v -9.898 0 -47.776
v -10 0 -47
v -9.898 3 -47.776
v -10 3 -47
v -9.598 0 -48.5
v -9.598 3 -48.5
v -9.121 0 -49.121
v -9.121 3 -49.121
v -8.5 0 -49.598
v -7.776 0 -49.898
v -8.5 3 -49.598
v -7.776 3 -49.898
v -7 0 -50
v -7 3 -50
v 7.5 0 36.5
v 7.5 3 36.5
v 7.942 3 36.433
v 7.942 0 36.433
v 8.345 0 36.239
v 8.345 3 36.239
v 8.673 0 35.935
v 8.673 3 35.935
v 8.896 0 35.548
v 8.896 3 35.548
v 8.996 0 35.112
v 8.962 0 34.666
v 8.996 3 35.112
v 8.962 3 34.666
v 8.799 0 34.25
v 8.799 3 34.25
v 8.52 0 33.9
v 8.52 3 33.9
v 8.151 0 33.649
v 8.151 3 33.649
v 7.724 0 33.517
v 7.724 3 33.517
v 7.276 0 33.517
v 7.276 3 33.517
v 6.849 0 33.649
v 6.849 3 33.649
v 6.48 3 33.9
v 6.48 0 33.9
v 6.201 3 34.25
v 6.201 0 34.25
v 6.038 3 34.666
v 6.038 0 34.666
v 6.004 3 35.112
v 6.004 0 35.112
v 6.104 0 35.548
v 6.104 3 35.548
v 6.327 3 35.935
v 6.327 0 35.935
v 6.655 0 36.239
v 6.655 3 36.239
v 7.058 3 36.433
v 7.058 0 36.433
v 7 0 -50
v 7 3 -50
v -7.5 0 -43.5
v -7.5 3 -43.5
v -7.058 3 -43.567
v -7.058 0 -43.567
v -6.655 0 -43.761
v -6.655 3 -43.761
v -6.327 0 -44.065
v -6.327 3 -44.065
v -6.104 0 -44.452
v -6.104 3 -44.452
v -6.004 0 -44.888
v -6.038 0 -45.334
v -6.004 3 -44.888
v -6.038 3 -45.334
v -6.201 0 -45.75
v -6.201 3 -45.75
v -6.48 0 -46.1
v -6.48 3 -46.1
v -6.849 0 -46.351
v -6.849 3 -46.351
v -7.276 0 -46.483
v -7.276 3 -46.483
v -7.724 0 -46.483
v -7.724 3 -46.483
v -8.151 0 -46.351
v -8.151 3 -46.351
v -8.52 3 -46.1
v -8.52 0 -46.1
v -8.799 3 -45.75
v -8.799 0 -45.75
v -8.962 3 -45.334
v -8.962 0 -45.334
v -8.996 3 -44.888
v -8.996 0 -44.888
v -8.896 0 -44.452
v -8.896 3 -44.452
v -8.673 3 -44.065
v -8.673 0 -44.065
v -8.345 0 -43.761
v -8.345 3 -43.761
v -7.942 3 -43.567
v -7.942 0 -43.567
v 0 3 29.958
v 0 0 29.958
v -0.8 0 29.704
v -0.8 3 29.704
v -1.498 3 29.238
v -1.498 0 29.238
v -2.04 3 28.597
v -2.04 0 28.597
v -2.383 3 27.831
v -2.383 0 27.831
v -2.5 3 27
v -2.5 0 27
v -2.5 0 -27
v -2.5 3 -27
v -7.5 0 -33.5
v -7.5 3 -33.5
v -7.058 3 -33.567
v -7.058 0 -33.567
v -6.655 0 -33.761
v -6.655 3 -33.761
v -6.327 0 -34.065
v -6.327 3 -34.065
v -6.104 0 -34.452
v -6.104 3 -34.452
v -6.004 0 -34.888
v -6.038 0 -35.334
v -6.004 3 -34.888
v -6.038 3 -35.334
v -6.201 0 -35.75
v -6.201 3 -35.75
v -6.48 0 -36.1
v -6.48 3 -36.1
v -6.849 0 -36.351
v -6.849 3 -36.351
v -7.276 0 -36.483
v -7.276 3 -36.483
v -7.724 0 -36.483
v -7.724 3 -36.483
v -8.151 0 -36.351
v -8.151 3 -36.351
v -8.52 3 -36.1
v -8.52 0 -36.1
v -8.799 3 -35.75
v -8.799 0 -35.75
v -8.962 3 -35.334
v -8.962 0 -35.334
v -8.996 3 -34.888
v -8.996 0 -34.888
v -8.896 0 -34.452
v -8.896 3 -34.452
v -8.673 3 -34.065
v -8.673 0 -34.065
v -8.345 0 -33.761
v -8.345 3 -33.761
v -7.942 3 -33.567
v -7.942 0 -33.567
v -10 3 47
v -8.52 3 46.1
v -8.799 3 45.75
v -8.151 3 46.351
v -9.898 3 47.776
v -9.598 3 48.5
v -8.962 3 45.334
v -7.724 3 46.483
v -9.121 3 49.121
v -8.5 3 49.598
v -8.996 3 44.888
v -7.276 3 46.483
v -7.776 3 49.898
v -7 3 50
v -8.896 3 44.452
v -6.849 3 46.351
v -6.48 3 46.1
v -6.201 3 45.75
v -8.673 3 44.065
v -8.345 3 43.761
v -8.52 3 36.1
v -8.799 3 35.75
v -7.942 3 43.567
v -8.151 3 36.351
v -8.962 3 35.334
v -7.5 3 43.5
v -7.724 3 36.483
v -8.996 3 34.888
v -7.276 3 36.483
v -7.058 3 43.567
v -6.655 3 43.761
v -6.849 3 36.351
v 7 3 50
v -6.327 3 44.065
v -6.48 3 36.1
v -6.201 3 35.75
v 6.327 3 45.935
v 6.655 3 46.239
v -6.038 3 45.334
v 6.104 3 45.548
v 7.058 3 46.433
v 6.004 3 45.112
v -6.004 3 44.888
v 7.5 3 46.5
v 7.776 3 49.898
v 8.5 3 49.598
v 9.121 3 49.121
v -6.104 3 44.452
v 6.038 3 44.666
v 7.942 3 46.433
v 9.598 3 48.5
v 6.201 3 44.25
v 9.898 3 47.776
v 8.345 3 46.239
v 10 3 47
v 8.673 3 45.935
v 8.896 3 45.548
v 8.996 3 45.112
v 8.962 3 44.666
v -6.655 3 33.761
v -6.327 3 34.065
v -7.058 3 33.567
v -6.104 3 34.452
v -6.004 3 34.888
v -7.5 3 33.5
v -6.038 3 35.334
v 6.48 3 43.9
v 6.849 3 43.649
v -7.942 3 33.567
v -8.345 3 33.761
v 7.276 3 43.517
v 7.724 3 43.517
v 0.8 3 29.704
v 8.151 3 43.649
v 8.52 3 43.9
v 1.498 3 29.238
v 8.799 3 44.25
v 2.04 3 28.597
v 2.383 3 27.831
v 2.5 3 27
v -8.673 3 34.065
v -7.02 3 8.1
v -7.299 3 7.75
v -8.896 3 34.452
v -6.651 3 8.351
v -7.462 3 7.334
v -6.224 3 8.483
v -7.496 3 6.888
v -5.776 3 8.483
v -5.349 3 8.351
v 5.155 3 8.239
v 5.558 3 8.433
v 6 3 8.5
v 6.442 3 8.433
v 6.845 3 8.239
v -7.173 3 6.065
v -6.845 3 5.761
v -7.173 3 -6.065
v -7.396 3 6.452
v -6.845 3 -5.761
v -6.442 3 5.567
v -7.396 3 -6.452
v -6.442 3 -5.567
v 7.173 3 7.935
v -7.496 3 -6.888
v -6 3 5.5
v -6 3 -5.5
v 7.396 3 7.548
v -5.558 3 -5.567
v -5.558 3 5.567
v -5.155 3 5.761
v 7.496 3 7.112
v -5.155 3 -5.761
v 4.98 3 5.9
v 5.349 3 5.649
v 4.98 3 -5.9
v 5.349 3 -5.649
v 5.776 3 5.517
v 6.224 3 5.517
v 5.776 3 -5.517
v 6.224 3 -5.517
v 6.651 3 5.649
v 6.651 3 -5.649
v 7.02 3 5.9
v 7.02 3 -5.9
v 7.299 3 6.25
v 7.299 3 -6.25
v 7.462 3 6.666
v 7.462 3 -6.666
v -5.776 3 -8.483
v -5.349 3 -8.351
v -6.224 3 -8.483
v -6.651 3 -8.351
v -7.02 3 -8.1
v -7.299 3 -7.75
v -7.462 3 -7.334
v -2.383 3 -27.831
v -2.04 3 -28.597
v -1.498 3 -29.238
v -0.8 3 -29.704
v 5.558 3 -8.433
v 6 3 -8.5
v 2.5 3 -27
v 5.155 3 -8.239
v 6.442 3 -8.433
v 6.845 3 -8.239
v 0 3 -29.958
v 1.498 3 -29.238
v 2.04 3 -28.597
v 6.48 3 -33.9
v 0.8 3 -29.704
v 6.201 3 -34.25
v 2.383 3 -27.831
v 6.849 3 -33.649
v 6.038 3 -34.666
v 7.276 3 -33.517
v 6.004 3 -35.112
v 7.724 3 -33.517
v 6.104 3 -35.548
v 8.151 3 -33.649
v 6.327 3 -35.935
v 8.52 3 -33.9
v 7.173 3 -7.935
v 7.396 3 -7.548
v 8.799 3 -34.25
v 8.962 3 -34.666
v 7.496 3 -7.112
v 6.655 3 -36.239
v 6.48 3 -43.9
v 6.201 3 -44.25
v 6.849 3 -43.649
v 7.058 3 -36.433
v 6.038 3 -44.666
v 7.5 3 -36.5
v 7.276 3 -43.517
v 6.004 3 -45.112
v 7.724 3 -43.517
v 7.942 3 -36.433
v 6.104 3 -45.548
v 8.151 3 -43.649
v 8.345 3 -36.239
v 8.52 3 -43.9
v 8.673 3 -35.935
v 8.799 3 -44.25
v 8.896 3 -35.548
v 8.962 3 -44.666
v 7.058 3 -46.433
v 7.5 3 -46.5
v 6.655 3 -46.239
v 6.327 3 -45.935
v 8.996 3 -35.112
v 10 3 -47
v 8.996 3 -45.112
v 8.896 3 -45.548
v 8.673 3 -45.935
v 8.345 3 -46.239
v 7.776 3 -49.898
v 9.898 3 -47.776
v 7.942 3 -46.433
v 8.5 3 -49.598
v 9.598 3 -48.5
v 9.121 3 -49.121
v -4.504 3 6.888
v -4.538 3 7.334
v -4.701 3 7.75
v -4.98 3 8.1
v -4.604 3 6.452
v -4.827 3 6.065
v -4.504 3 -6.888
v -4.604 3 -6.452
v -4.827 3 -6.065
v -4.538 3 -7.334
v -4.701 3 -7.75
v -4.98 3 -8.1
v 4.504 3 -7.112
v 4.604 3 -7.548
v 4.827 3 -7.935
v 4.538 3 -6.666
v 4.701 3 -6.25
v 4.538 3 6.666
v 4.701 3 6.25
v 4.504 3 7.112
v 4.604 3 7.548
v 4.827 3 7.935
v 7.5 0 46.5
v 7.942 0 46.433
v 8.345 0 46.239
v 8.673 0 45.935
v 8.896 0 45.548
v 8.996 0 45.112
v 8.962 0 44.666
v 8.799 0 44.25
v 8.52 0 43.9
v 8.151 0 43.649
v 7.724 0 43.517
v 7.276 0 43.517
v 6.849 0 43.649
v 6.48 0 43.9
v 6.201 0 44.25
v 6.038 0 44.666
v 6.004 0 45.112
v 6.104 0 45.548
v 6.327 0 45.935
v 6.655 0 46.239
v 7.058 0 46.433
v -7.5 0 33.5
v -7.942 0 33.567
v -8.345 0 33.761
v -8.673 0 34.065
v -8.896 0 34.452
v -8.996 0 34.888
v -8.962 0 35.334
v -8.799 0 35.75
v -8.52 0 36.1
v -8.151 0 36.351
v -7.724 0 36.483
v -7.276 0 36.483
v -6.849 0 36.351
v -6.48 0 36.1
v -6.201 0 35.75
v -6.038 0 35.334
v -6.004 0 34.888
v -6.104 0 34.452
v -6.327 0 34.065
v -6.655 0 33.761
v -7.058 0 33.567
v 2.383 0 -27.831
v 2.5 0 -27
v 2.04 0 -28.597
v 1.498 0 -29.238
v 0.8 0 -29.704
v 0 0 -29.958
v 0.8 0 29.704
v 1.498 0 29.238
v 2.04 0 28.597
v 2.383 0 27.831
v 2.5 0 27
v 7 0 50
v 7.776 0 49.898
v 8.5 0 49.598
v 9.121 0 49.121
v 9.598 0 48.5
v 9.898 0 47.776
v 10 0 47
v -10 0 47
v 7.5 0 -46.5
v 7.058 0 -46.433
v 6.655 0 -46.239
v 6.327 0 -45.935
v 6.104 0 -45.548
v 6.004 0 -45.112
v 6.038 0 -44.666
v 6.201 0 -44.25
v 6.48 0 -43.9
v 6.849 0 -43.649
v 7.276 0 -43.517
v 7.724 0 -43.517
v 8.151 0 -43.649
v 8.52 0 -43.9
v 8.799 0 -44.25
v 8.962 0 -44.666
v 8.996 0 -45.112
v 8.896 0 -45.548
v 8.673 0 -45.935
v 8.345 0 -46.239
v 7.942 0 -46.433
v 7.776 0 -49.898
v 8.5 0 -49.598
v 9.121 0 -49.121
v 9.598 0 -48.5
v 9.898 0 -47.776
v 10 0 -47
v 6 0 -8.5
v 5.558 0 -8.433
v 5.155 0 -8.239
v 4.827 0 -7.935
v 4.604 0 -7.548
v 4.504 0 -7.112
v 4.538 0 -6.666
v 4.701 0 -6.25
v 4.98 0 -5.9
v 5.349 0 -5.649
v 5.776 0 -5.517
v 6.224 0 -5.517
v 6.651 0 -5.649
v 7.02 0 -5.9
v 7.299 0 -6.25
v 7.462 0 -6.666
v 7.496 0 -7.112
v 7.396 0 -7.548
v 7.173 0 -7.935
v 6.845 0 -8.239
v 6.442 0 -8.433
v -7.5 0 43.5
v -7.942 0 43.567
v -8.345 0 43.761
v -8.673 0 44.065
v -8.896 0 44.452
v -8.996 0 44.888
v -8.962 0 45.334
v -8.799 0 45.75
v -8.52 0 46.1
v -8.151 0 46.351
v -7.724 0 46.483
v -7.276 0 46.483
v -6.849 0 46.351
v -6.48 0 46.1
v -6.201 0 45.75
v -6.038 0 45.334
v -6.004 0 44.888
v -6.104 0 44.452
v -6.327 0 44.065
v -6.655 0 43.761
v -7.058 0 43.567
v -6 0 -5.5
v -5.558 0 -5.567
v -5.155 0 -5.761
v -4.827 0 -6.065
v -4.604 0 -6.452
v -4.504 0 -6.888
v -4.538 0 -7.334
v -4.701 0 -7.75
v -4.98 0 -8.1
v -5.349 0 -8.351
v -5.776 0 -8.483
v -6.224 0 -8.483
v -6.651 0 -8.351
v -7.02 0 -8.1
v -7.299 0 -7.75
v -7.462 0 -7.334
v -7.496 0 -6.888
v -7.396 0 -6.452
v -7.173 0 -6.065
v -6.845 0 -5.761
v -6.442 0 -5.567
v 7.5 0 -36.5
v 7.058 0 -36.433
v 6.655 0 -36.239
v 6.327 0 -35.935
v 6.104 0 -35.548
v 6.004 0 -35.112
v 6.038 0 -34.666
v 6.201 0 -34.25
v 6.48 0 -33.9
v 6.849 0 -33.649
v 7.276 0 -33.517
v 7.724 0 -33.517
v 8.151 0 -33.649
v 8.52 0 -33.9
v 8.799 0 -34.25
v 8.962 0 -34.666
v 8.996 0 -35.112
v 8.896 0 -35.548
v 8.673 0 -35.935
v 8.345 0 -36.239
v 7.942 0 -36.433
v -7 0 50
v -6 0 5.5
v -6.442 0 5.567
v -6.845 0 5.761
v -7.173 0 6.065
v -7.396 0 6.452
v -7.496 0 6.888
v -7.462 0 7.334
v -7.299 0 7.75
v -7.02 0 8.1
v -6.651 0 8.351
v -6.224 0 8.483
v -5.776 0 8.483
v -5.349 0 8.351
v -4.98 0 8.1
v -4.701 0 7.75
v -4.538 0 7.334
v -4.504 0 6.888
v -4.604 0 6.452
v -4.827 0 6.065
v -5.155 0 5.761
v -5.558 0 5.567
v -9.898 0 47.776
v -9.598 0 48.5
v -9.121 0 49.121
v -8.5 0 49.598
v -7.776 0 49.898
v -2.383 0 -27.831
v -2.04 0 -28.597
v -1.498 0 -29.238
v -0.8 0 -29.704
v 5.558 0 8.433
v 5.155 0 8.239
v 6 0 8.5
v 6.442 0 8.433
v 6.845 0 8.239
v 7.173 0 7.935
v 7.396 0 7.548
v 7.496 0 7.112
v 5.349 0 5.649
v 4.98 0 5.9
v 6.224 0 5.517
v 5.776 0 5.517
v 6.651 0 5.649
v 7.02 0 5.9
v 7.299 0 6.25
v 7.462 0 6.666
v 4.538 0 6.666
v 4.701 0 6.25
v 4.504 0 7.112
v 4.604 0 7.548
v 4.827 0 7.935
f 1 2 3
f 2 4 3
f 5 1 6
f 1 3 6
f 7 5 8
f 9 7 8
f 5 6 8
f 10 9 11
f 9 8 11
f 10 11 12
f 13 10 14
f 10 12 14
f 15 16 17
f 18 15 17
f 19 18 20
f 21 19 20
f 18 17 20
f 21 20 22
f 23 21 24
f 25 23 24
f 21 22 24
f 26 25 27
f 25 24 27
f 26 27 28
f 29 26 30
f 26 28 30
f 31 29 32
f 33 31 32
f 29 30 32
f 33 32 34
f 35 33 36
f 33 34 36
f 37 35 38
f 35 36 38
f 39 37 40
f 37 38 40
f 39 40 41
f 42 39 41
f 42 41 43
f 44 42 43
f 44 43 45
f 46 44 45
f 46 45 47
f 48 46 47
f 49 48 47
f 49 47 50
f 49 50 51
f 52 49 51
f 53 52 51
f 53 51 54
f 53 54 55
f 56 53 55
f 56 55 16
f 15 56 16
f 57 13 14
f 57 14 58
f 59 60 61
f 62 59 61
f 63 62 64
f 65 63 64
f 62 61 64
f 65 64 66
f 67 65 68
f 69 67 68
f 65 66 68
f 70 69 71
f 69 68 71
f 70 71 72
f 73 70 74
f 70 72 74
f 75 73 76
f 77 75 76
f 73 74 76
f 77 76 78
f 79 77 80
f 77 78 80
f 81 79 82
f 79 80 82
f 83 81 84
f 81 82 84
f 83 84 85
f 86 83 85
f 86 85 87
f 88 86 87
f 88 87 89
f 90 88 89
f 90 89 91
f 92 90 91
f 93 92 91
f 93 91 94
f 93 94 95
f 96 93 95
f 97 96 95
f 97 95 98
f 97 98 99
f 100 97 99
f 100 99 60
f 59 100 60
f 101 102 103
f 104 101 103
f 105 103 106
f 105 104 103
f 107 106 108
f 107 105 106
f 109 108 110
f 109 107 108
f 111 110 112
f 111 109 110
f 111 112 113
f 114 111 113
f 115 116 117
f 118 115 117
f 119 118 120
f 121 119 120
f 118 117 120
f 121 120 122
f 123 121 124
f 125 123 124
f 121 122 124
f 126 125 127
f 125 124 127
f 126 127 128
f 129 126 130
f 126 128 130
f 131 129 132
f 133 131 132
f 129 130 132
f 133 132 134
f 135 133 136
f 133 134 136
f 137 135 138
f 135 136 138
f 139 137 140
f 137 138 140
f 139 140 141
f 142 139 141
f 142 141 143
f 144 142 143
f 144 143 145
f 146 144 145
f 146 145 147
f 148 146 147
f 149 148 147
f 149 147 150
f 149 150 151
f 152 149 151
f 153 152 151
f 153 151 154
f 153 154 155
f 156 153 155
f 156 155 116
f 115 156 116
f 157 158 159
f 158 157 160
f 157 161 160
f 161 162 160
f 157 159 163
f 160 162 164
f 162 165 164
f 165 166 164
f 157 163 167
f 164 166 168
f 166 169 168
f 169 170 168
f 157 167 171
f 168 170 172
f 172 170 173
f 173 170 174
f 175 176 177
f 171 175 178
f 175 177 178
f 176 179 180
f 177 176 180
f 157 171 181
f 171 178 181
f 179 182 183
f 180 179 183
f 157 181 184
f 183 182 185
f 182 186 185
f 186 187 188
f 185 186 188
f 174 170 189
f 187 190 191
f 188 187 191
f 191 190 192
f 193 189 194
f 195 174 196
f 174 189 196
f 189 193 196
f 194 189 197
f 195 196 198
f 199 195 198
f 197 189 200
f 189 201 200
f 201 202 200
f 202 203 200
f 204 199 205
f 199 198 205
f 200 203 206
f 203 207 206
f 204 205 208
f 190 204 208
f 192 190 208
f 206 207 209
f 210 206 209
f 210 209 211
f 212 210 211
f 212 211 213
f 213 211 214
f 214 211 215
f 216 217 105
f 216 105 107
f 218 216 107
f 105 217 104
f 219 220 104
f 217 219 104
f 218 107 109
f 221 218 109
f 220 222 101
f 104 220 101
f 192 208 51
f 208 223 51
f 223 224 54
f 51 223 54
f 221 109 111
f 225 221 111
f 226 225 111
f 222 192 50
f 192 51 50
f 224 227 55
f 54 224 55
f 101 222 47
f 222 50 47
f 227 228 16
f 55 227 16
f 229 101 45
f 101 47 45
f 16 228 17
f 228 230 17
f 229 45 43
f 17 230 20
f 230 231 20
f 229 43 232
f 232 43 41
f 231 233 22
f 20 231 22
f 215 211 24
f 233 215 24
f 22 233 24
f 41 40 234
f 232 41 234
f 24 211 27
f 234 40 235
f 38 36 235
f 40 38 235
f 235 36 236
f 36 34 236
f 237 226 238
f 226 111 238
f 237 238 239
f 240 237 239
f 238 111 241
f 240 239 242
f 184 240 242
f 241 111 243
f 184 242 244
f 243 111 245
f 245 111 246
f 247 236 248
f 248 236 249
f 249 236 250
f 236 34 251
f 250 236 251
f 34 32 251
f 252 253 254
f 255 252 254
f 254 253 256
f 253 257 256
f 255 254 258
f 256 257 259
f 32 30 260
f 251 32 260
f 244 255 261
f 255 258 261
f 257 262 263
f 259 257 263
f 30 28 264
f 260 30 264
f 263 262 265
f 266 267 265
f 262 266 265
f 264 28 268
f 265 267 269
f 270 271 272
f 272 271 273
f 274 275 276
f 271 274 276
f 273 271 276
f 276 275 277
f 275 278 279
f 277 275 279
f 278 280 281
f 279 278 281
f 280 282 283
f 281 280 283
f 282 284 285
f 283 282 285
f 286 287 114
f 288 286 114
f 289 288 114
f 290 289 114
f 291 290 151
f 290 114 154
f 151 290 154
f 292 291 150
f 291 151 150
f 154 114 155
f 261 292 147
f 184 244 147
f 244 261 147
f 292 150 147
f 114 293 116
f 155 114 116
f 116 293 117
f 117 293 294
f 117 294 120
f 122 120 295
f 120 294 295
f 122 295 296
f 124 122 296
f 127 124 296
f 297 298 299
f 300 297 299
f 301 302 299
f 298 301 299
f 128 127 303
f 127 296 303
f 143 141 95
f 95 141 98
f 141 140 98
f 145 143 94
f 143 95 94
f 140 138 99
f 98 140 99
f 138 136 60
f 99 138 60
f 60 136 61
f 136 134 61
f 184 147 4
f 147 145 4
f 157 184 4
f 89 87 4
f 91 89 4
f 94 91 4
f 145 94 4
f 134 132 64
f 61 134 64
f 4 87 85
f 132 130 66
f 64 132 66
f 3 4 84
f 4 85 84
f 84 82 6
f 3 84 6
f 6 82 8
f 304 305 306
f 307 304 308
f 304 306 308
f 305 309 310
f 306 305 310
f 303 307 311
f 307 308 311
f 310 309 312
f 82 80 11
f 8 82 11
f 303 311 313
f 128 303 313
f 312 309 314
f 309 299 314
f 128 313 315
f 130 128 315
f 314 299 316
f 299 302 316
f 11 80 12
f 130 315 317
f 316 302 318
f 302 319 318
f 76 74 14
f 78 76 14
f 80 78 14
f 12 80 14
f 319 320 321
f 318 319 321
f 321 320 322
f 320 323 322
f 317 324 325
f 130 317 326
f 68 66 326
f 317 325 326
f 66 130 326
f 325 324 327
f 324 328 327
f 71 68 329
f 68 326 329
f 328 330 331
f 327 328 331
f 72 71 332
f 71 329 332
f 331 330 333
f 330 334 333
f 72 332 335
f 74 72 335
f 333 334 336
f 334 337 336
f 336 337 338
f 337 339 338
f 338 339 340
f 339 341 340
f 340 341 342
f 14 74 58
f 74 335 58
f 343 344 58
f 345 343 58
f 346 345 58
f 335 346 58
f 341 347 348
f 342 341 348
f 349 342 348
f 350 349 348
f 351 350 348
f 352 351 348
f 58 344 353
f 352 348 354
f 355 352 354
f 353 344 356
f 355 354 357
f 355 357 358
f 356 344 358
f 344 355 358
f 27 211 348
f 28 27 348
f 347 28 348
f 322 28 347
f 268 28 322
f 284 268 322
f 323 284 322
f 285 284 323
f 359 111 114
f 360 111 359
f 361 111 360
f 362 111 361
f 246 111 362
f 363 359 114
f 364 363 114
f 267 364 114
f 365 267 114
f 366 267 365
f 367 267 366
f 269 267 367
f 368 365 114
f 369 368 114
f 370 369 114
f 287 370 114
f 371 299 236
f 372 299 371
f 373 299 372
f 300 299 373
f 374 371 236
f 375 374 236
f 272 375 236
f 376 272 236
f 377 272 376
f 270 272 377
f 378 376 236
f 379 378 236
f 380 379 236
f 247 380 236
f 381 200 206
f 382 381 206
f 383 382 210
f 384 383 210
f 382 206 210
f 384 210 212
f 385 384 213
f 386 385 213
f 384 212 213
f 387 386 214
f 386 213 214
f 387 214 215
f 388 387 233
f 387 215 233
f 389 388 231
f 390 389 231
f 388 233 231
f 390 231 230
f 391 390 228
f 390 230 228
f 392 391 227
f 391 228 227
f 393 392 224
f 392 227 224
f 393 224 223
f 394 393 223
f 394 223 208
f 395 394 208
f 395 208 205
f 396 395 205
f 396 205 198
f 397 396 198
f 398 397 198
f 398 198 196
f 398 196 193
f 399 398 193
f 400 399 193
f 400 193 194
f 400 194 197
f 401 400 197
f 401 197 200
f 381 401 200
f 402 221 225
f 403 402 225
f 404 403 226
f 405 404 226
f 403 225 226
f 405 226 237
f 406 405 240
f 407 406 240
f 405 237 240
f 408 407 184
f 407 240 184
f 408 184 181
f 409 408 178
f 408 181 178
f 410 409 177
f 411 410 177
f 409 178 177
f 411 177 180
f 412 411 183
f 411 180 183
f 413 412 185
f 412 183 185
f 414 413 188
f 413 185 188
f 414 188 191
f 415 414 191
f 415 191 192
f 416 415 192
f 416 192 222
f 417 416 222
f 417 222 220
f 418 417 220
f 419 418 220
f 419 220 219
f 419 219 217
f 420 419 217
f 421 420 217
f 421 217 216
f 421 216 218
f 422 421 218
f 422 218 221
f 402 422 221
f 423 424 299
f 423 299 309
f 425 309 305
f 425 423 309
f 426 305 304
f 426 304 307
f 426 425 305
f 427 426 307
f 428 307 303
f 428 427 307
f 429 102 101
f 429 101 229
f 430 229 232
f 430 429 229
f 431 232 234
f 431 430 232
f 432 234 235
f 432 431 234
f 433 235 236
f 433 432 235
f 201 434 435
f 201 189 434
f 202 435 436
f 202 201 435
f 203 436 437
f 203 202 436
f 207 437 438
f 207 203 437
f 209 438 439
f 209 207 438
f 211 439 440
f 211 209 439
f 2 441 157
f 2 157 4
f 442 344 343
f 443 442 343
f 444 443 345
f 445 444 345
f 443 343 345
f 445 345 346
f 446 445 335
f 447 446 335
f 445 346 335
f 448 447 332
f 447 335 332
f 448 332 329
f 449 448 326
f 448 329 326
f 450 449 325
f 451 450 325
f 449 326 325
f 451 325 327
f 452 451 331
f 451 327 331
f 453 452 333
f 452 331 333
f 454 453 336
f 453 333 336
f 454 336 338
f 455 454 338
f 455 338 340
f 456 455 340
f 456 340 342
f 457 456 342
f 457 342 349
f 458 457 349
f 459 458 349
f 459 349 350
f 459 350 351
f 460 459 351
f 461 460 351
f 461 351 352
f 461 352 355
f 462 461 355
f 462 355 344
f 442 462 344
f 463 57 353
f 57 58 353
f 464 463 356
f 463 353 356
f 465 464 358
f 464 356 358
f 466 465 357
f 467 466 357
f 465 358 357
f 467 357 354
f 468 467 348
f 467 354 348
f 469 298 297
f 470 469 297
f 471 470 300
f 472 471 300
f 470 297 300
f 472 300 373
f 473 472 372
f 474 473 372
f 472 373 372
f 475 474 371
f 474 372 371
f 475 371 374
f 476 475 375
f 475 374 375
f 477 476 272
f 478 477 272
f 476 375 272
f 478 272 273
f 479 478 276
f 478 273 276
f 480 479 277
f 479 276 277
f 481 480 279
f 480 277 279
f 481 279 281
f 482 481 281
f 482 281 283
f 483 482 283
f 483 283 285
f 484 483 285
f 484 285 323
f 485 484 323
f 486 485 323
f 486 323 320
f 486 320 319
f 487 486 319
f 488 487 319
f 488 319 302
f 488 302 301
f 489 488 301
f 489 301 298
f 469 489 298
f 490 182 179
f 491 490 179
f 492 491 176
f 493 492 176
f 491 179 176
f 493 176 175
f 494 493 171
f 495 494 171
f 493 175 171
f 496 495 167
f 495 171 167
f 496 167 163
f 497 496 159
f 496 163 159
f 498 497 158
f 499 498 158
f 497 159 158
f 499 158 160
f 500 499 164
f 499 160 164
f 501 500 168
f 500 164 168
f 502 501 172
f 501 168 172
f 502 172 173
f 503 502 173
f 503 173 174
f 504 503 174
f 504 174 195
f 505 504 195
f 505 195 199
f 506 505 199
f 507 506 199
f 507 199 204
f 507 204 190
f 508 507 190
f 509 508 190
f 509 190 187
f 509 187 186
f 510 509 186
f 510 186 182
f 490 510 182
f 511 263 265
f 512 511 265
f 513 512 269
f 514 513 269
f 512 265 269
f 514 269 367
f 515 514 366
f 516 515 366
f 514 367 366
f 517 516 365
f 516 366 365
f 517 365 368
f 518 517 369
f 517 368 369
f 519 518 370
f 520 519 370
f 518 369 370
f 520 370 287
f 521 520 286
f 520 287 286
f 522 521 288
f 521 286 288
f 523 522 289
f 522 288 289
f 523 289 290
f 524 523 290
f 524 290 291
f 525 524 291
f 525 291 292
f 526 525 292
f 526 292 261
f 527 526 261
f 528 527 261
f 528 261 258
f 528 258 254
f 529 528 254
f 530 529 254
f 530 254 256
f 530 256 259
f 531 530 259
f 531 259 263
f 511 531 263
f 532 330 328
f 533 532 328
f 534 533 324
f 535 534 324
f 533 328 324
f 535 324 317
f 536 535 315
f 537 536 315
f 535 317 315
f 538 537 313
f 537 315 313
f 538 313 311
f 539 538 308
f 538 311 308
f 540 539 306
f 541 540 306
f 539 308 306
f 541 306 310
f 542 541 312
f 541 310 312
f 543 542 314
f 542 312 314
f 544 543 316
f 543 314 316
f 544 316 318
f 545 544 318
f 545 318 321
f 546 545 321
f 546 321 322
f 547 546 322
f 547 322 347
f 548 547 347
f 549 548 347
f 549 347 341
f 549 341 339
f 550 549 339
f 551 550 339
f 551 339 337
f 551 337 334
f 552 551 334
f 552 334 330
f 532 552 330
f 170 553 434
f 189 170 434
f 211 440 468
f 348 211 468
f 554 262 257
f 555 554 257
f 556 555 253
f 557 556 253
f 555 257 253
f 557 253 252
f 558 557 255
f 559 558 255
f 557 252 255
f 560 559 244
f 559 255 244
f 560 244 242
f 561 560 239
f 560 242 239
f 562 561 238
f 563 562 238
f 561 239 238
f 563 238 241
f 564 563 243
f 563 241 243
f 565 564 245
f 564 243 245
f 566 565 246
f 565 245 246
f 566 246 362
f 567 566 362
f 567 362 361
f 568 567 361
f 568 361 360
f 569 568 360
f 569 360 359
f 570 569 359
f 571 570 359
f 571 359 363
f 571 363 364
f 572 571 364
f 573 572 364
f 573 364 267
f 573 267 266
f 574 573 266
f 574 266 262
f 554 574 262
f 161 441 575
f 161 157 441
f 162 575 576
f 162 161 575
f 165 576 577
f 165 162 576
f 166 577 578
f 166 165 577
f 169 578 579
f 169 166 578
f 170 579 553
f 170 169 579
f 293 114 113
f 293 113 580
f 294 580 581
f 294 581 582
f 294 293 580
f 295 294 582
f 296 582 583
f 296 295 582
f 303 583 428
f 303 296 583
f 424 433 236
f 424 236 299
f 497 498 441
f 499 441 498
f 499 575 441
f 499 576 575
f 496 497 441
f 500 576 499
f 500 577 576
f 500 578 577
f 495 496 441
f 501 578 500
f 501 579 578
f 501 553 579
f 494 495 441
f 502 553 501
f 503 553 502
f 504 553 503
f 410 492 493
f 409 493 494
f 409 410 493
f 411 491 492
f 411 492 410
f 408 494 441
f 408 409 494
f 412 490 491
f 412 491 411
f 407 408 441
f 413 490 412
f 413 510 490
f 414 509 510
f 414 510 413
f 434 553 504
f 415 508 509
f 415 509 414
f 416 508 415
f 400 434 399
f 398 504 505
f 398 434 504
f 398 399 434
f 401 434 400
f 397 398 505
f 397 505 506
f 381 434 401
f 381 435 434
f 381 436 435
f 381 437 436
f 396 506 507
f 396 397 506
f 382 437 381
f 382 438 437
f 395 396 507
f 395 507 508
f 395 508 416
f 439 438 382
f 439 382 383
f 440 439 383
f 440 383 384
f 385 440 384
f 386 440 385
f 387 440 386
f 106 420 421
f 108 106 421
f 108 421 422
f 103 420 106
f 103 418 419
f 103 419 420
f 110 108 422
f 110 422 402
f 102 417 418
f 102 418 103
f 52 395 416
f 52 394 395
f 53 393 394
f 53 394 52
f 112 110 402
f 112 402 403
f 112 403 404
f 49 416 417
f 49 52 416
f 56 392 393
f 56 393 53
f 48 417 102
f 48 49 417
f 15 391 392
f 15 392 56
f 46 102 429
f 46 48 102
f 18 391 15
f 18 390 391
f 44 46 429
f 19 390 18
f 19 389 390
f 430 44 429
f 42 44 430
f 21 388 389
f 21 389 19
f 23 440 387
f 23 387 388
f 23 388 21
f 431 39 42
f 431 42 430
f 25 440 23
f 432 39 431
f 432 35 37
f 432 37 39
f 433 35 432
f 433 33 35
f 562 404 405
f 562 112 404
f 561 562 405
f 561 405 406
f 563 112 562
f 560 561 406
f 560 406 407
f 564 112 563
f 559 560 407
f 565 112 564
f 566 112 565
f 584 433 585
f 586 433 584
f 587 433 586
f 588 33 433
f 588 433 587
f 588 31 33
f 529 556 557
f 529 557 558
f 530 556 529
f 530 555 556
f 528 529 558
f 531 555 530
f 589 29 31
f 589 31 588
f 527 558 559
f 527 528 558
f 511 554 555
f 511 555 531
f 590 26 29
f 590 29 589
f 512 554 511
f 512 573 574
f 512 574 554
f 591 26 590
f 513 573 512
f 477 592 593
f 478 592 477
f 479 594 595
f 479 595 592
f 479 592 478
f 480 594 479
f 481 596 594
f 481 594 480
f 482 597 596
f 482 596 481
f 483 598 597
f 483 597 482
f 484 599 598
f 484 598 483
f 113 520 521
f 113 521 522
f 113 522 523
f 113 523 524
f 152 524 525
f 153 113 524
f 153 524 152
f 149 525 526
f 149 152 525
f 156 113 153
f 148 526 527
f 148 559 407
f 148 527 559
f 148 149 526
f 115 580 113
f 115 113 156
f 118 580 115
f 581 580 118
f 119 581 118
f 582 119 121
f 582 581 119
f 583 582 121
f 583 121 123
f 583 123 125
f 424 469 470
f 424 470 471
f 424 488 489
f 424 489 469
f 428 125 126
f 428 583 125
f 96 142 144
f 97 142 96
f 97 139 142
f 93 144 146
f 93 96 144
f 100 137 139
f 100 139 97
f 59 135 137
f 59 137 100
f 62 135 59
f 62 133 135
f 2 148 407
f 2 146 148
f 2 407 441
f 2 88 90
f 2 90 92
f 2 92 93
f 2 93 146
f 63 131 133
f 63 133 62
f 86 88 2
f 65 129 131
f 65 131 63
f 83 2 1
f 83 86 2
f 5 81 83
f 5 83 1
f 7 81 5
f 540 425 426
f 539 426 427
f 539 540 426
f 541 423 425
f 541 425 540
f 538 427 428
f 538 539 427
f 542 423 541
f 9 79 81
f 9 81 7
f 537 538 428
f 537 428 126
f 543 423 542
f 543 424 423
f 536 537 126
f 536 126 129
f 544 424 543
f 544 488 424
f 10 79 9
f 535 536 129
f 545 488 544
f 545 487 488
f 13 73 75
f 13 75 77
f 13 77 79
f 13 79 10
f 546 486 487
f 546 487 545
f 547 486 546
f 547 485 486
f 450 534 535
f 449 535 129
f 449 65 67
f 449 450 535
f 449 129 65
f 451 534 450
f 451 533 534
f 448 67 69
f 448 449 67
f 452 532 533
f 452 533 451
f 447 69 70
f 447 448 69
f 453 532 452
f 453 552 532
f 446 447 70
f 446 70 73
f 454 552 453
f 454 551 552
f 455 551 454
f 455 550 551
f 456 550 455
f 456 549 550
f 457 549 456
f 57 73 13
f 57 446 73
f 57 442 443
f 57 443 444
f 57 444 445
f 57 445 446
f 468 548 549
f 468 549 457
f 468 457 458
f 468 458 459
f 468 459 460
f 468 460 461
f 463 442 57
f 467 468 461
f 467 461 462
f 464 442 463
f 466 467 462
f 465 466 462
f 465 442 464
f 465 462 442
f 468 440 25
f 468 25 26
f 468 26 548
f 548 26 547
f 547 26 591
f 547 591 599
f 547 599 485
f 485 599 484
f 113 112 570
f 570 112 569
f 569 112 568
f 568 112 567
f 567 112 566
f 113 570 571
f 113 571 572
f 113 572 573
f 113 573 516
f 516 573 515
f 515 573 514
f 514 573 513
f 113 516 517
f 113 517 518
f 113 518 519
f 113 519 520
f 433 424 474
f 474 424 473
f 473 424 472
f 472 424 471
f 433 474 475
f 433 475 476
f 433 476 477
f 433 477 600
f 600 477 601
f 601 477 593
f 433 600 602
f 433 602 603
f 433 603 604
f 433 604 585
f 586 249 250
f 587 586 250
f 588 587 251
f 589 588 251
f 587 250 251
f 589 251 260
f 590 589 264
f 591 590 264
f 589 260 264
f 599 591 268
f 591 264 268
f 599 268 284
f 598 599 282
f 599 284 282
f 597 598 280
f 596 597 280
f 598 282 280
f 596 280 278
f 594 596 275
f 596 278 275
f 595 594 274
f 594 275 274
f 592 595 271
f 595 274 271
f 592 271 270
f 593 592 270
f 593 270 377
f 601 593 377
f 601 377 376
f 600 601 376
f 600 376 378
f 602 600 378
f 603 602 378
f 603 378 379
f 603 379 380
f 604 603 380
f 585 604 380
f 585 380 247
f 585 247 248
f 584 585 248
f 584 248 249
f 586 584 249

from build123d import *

# Parameters (mm, degrees)
SKETCH_1_W               = 20
SKETCH_1_H               = 100
EXTRUDE_1_DEPTH          = 3
SKETCH_2_R               = 1.5
CUT_EXTRUDE_1_DEPTH      = 52.078371156
CUT_EXTRUDE_2_DEPTH      = 52.078371156
CUT_EXTRUDE_2_DEPTH_BACK = 52.078371156
SKETCH_3_W               = 5
SKETCH_3_H               = 60
FILLET_1_R               = 3
FILLET_2_R               = 3
SKETCH_4_R               = 1.5
CUT_EXTRUDE_3_DEPTH      = 52.078371156


with BuildPart() as part:
    # 草图1 → 凸台-拉伸1 (new body)
    with BuildSketch(Plane(origin=(0, 0, 0), x_dir=(1, 0, 0), z_dir=(0, 1, 0))):
        Rectangle(SKETCH_1_W, SKETCH_1_H)
    extrude(amount=EXTRUDE_1_DEPTH)

    # 草图2 → 切除-拉伸1 (cut, through all)
    with BuildSketch(Plane(origin=(0, 3, 0), x_dir=(1, 0, 0), z_dir=(0, 1, 0))):
        with Locations(Location((-7.5, 45, 0), (0, 0, 270))):
            Circle(SKETCH_2_R)
        with Locations(Location((-7.5, 35, 0), (0, 0, 270))):
            Circle(SKETCH_2_R)
        with Locations(Location((7.5, 45, 0), (0, 0, 90))):
            Circle(SKETCH_2_R)
        with Locations(Location((7.5, 35, 0), (0, 0, 90))):
            Circle(SKETCH_2_R)
        with Locations(Location((7.5, -35, 0), (0, 0, 270))):
            Circle(SKETCH_2_R)
        with Locations(Location((7.5, -45, 0), (0, 0, 270))):
            Circle(SKETCH_2_R)
        with Locations(Location((-7.5, -35, 0), (0, 0, 90))):
            Circle(SKETCH_2_R)
        with Locations(Location((-7.5, -45, 0), (0, 0, 90))):
            Circle(SKETCH_2_R)
    extrude(amount=-CUT_EXTRUDE_1_DEPTH, mode=Mode.SUBTRACT)

    # 草图3 → 切除-拉伸2 (cut, two sides: drawn at the far end of the back side and taken through both)
    with BuildSketch(Plane(origin=(0, 3, 0), x_dir=(1, 0, 0), z_dir=(0, 1, 0)).offset(-CUT_EXTRUDE_2_DEPTH_BACK)):
        Rectangle(SKETCH_3_W, SKETCH_3_H)
    extrude(amount=CUT_EXTRUDE_2_DEPTH + CUT_EXTRUDE_2_DEPTH_BACK, mode=Mode.SUBTRACT)

    # 圆角1
    # the kernel refuses this fillet: 3 mm, written as the material it adds along each edge
    with BuildSketch(Plane(origin=(-2.5, 3, -30), x_dir=(1, 0, 0), z_dir=(0, -1, 0)), Plane(origin=(-2.5, 3, 30), x_dir=(0, 0, -1), z_dir=(0, -1, 0)), Plane(origin=(2.5, 0, 30), x_dir=(0, 0, -1), z_dir=(0, 1, 0))) as fillet_1_piece_1:
        with BuildLine():
            CenterArc((FILLET_1_R, FILLET_1_R), FILLET_1_R, 180, 90)
            Line((0, FILLET_1_R), (0, 0))
            Line((0, 0), (FILLET_1_R, 0))
        make_face()
    extrude(amount=3)
    with BuildSketch(Plane(origin=(2.5, 0, -30), x_dir=(0, 0, 1), z_dir=(0, 1, 0))) as fillet_1_piece_2:
        with BuildLine():
            CenterArc((FILLET_1_R, -FILLET_1_R), FILLET_1_R, 90, 90)
            Line((0, -FILLET_1_R), (0, 0))
            Line((0, 0), (FILLET_1_R, 0))
        make_face()
    extrude(amount=3)

    # 圆角2
    fillet_2_edges = [part.edges().sort_by_distance(p)[0] for p in [
        (10, 1.5, 50),
        (-10, 1.5, 50),
        (-10, 1.5, -50),
        (10, 1.5, -50),
    ]]
    fillet(fillet_2_edges, radius=FILLET_2_R)

    # 草图4 → 切除-拉伸3 (cut, through all)
    with BuildSketch(Plane(origin=(0, 3, 0), x_dir=(1, 0, 0), z_dir=(0, 1, 0))):
        with Locations(Location((-6, 7, 0), (0, 0, 270))):
            Circle(SKETCH_4_R)
        with Locations(Location((6, 7, 0), (0, 0, 90))):
            Circle(SKETCH_4_R)
        with Locations(Location((6, -7, 0), (0, 0, 270))):
            Circle(SKETCH_4_R)
        with Locations(Location((-6, -7, 0), (0, 0, 90))):
            Circle(SKETCH_4_R)
    extrude(amount=-CUT_EXTRUDE_3_DEPTH, mode=Mode.SUBTRACT)


solid = part.part
